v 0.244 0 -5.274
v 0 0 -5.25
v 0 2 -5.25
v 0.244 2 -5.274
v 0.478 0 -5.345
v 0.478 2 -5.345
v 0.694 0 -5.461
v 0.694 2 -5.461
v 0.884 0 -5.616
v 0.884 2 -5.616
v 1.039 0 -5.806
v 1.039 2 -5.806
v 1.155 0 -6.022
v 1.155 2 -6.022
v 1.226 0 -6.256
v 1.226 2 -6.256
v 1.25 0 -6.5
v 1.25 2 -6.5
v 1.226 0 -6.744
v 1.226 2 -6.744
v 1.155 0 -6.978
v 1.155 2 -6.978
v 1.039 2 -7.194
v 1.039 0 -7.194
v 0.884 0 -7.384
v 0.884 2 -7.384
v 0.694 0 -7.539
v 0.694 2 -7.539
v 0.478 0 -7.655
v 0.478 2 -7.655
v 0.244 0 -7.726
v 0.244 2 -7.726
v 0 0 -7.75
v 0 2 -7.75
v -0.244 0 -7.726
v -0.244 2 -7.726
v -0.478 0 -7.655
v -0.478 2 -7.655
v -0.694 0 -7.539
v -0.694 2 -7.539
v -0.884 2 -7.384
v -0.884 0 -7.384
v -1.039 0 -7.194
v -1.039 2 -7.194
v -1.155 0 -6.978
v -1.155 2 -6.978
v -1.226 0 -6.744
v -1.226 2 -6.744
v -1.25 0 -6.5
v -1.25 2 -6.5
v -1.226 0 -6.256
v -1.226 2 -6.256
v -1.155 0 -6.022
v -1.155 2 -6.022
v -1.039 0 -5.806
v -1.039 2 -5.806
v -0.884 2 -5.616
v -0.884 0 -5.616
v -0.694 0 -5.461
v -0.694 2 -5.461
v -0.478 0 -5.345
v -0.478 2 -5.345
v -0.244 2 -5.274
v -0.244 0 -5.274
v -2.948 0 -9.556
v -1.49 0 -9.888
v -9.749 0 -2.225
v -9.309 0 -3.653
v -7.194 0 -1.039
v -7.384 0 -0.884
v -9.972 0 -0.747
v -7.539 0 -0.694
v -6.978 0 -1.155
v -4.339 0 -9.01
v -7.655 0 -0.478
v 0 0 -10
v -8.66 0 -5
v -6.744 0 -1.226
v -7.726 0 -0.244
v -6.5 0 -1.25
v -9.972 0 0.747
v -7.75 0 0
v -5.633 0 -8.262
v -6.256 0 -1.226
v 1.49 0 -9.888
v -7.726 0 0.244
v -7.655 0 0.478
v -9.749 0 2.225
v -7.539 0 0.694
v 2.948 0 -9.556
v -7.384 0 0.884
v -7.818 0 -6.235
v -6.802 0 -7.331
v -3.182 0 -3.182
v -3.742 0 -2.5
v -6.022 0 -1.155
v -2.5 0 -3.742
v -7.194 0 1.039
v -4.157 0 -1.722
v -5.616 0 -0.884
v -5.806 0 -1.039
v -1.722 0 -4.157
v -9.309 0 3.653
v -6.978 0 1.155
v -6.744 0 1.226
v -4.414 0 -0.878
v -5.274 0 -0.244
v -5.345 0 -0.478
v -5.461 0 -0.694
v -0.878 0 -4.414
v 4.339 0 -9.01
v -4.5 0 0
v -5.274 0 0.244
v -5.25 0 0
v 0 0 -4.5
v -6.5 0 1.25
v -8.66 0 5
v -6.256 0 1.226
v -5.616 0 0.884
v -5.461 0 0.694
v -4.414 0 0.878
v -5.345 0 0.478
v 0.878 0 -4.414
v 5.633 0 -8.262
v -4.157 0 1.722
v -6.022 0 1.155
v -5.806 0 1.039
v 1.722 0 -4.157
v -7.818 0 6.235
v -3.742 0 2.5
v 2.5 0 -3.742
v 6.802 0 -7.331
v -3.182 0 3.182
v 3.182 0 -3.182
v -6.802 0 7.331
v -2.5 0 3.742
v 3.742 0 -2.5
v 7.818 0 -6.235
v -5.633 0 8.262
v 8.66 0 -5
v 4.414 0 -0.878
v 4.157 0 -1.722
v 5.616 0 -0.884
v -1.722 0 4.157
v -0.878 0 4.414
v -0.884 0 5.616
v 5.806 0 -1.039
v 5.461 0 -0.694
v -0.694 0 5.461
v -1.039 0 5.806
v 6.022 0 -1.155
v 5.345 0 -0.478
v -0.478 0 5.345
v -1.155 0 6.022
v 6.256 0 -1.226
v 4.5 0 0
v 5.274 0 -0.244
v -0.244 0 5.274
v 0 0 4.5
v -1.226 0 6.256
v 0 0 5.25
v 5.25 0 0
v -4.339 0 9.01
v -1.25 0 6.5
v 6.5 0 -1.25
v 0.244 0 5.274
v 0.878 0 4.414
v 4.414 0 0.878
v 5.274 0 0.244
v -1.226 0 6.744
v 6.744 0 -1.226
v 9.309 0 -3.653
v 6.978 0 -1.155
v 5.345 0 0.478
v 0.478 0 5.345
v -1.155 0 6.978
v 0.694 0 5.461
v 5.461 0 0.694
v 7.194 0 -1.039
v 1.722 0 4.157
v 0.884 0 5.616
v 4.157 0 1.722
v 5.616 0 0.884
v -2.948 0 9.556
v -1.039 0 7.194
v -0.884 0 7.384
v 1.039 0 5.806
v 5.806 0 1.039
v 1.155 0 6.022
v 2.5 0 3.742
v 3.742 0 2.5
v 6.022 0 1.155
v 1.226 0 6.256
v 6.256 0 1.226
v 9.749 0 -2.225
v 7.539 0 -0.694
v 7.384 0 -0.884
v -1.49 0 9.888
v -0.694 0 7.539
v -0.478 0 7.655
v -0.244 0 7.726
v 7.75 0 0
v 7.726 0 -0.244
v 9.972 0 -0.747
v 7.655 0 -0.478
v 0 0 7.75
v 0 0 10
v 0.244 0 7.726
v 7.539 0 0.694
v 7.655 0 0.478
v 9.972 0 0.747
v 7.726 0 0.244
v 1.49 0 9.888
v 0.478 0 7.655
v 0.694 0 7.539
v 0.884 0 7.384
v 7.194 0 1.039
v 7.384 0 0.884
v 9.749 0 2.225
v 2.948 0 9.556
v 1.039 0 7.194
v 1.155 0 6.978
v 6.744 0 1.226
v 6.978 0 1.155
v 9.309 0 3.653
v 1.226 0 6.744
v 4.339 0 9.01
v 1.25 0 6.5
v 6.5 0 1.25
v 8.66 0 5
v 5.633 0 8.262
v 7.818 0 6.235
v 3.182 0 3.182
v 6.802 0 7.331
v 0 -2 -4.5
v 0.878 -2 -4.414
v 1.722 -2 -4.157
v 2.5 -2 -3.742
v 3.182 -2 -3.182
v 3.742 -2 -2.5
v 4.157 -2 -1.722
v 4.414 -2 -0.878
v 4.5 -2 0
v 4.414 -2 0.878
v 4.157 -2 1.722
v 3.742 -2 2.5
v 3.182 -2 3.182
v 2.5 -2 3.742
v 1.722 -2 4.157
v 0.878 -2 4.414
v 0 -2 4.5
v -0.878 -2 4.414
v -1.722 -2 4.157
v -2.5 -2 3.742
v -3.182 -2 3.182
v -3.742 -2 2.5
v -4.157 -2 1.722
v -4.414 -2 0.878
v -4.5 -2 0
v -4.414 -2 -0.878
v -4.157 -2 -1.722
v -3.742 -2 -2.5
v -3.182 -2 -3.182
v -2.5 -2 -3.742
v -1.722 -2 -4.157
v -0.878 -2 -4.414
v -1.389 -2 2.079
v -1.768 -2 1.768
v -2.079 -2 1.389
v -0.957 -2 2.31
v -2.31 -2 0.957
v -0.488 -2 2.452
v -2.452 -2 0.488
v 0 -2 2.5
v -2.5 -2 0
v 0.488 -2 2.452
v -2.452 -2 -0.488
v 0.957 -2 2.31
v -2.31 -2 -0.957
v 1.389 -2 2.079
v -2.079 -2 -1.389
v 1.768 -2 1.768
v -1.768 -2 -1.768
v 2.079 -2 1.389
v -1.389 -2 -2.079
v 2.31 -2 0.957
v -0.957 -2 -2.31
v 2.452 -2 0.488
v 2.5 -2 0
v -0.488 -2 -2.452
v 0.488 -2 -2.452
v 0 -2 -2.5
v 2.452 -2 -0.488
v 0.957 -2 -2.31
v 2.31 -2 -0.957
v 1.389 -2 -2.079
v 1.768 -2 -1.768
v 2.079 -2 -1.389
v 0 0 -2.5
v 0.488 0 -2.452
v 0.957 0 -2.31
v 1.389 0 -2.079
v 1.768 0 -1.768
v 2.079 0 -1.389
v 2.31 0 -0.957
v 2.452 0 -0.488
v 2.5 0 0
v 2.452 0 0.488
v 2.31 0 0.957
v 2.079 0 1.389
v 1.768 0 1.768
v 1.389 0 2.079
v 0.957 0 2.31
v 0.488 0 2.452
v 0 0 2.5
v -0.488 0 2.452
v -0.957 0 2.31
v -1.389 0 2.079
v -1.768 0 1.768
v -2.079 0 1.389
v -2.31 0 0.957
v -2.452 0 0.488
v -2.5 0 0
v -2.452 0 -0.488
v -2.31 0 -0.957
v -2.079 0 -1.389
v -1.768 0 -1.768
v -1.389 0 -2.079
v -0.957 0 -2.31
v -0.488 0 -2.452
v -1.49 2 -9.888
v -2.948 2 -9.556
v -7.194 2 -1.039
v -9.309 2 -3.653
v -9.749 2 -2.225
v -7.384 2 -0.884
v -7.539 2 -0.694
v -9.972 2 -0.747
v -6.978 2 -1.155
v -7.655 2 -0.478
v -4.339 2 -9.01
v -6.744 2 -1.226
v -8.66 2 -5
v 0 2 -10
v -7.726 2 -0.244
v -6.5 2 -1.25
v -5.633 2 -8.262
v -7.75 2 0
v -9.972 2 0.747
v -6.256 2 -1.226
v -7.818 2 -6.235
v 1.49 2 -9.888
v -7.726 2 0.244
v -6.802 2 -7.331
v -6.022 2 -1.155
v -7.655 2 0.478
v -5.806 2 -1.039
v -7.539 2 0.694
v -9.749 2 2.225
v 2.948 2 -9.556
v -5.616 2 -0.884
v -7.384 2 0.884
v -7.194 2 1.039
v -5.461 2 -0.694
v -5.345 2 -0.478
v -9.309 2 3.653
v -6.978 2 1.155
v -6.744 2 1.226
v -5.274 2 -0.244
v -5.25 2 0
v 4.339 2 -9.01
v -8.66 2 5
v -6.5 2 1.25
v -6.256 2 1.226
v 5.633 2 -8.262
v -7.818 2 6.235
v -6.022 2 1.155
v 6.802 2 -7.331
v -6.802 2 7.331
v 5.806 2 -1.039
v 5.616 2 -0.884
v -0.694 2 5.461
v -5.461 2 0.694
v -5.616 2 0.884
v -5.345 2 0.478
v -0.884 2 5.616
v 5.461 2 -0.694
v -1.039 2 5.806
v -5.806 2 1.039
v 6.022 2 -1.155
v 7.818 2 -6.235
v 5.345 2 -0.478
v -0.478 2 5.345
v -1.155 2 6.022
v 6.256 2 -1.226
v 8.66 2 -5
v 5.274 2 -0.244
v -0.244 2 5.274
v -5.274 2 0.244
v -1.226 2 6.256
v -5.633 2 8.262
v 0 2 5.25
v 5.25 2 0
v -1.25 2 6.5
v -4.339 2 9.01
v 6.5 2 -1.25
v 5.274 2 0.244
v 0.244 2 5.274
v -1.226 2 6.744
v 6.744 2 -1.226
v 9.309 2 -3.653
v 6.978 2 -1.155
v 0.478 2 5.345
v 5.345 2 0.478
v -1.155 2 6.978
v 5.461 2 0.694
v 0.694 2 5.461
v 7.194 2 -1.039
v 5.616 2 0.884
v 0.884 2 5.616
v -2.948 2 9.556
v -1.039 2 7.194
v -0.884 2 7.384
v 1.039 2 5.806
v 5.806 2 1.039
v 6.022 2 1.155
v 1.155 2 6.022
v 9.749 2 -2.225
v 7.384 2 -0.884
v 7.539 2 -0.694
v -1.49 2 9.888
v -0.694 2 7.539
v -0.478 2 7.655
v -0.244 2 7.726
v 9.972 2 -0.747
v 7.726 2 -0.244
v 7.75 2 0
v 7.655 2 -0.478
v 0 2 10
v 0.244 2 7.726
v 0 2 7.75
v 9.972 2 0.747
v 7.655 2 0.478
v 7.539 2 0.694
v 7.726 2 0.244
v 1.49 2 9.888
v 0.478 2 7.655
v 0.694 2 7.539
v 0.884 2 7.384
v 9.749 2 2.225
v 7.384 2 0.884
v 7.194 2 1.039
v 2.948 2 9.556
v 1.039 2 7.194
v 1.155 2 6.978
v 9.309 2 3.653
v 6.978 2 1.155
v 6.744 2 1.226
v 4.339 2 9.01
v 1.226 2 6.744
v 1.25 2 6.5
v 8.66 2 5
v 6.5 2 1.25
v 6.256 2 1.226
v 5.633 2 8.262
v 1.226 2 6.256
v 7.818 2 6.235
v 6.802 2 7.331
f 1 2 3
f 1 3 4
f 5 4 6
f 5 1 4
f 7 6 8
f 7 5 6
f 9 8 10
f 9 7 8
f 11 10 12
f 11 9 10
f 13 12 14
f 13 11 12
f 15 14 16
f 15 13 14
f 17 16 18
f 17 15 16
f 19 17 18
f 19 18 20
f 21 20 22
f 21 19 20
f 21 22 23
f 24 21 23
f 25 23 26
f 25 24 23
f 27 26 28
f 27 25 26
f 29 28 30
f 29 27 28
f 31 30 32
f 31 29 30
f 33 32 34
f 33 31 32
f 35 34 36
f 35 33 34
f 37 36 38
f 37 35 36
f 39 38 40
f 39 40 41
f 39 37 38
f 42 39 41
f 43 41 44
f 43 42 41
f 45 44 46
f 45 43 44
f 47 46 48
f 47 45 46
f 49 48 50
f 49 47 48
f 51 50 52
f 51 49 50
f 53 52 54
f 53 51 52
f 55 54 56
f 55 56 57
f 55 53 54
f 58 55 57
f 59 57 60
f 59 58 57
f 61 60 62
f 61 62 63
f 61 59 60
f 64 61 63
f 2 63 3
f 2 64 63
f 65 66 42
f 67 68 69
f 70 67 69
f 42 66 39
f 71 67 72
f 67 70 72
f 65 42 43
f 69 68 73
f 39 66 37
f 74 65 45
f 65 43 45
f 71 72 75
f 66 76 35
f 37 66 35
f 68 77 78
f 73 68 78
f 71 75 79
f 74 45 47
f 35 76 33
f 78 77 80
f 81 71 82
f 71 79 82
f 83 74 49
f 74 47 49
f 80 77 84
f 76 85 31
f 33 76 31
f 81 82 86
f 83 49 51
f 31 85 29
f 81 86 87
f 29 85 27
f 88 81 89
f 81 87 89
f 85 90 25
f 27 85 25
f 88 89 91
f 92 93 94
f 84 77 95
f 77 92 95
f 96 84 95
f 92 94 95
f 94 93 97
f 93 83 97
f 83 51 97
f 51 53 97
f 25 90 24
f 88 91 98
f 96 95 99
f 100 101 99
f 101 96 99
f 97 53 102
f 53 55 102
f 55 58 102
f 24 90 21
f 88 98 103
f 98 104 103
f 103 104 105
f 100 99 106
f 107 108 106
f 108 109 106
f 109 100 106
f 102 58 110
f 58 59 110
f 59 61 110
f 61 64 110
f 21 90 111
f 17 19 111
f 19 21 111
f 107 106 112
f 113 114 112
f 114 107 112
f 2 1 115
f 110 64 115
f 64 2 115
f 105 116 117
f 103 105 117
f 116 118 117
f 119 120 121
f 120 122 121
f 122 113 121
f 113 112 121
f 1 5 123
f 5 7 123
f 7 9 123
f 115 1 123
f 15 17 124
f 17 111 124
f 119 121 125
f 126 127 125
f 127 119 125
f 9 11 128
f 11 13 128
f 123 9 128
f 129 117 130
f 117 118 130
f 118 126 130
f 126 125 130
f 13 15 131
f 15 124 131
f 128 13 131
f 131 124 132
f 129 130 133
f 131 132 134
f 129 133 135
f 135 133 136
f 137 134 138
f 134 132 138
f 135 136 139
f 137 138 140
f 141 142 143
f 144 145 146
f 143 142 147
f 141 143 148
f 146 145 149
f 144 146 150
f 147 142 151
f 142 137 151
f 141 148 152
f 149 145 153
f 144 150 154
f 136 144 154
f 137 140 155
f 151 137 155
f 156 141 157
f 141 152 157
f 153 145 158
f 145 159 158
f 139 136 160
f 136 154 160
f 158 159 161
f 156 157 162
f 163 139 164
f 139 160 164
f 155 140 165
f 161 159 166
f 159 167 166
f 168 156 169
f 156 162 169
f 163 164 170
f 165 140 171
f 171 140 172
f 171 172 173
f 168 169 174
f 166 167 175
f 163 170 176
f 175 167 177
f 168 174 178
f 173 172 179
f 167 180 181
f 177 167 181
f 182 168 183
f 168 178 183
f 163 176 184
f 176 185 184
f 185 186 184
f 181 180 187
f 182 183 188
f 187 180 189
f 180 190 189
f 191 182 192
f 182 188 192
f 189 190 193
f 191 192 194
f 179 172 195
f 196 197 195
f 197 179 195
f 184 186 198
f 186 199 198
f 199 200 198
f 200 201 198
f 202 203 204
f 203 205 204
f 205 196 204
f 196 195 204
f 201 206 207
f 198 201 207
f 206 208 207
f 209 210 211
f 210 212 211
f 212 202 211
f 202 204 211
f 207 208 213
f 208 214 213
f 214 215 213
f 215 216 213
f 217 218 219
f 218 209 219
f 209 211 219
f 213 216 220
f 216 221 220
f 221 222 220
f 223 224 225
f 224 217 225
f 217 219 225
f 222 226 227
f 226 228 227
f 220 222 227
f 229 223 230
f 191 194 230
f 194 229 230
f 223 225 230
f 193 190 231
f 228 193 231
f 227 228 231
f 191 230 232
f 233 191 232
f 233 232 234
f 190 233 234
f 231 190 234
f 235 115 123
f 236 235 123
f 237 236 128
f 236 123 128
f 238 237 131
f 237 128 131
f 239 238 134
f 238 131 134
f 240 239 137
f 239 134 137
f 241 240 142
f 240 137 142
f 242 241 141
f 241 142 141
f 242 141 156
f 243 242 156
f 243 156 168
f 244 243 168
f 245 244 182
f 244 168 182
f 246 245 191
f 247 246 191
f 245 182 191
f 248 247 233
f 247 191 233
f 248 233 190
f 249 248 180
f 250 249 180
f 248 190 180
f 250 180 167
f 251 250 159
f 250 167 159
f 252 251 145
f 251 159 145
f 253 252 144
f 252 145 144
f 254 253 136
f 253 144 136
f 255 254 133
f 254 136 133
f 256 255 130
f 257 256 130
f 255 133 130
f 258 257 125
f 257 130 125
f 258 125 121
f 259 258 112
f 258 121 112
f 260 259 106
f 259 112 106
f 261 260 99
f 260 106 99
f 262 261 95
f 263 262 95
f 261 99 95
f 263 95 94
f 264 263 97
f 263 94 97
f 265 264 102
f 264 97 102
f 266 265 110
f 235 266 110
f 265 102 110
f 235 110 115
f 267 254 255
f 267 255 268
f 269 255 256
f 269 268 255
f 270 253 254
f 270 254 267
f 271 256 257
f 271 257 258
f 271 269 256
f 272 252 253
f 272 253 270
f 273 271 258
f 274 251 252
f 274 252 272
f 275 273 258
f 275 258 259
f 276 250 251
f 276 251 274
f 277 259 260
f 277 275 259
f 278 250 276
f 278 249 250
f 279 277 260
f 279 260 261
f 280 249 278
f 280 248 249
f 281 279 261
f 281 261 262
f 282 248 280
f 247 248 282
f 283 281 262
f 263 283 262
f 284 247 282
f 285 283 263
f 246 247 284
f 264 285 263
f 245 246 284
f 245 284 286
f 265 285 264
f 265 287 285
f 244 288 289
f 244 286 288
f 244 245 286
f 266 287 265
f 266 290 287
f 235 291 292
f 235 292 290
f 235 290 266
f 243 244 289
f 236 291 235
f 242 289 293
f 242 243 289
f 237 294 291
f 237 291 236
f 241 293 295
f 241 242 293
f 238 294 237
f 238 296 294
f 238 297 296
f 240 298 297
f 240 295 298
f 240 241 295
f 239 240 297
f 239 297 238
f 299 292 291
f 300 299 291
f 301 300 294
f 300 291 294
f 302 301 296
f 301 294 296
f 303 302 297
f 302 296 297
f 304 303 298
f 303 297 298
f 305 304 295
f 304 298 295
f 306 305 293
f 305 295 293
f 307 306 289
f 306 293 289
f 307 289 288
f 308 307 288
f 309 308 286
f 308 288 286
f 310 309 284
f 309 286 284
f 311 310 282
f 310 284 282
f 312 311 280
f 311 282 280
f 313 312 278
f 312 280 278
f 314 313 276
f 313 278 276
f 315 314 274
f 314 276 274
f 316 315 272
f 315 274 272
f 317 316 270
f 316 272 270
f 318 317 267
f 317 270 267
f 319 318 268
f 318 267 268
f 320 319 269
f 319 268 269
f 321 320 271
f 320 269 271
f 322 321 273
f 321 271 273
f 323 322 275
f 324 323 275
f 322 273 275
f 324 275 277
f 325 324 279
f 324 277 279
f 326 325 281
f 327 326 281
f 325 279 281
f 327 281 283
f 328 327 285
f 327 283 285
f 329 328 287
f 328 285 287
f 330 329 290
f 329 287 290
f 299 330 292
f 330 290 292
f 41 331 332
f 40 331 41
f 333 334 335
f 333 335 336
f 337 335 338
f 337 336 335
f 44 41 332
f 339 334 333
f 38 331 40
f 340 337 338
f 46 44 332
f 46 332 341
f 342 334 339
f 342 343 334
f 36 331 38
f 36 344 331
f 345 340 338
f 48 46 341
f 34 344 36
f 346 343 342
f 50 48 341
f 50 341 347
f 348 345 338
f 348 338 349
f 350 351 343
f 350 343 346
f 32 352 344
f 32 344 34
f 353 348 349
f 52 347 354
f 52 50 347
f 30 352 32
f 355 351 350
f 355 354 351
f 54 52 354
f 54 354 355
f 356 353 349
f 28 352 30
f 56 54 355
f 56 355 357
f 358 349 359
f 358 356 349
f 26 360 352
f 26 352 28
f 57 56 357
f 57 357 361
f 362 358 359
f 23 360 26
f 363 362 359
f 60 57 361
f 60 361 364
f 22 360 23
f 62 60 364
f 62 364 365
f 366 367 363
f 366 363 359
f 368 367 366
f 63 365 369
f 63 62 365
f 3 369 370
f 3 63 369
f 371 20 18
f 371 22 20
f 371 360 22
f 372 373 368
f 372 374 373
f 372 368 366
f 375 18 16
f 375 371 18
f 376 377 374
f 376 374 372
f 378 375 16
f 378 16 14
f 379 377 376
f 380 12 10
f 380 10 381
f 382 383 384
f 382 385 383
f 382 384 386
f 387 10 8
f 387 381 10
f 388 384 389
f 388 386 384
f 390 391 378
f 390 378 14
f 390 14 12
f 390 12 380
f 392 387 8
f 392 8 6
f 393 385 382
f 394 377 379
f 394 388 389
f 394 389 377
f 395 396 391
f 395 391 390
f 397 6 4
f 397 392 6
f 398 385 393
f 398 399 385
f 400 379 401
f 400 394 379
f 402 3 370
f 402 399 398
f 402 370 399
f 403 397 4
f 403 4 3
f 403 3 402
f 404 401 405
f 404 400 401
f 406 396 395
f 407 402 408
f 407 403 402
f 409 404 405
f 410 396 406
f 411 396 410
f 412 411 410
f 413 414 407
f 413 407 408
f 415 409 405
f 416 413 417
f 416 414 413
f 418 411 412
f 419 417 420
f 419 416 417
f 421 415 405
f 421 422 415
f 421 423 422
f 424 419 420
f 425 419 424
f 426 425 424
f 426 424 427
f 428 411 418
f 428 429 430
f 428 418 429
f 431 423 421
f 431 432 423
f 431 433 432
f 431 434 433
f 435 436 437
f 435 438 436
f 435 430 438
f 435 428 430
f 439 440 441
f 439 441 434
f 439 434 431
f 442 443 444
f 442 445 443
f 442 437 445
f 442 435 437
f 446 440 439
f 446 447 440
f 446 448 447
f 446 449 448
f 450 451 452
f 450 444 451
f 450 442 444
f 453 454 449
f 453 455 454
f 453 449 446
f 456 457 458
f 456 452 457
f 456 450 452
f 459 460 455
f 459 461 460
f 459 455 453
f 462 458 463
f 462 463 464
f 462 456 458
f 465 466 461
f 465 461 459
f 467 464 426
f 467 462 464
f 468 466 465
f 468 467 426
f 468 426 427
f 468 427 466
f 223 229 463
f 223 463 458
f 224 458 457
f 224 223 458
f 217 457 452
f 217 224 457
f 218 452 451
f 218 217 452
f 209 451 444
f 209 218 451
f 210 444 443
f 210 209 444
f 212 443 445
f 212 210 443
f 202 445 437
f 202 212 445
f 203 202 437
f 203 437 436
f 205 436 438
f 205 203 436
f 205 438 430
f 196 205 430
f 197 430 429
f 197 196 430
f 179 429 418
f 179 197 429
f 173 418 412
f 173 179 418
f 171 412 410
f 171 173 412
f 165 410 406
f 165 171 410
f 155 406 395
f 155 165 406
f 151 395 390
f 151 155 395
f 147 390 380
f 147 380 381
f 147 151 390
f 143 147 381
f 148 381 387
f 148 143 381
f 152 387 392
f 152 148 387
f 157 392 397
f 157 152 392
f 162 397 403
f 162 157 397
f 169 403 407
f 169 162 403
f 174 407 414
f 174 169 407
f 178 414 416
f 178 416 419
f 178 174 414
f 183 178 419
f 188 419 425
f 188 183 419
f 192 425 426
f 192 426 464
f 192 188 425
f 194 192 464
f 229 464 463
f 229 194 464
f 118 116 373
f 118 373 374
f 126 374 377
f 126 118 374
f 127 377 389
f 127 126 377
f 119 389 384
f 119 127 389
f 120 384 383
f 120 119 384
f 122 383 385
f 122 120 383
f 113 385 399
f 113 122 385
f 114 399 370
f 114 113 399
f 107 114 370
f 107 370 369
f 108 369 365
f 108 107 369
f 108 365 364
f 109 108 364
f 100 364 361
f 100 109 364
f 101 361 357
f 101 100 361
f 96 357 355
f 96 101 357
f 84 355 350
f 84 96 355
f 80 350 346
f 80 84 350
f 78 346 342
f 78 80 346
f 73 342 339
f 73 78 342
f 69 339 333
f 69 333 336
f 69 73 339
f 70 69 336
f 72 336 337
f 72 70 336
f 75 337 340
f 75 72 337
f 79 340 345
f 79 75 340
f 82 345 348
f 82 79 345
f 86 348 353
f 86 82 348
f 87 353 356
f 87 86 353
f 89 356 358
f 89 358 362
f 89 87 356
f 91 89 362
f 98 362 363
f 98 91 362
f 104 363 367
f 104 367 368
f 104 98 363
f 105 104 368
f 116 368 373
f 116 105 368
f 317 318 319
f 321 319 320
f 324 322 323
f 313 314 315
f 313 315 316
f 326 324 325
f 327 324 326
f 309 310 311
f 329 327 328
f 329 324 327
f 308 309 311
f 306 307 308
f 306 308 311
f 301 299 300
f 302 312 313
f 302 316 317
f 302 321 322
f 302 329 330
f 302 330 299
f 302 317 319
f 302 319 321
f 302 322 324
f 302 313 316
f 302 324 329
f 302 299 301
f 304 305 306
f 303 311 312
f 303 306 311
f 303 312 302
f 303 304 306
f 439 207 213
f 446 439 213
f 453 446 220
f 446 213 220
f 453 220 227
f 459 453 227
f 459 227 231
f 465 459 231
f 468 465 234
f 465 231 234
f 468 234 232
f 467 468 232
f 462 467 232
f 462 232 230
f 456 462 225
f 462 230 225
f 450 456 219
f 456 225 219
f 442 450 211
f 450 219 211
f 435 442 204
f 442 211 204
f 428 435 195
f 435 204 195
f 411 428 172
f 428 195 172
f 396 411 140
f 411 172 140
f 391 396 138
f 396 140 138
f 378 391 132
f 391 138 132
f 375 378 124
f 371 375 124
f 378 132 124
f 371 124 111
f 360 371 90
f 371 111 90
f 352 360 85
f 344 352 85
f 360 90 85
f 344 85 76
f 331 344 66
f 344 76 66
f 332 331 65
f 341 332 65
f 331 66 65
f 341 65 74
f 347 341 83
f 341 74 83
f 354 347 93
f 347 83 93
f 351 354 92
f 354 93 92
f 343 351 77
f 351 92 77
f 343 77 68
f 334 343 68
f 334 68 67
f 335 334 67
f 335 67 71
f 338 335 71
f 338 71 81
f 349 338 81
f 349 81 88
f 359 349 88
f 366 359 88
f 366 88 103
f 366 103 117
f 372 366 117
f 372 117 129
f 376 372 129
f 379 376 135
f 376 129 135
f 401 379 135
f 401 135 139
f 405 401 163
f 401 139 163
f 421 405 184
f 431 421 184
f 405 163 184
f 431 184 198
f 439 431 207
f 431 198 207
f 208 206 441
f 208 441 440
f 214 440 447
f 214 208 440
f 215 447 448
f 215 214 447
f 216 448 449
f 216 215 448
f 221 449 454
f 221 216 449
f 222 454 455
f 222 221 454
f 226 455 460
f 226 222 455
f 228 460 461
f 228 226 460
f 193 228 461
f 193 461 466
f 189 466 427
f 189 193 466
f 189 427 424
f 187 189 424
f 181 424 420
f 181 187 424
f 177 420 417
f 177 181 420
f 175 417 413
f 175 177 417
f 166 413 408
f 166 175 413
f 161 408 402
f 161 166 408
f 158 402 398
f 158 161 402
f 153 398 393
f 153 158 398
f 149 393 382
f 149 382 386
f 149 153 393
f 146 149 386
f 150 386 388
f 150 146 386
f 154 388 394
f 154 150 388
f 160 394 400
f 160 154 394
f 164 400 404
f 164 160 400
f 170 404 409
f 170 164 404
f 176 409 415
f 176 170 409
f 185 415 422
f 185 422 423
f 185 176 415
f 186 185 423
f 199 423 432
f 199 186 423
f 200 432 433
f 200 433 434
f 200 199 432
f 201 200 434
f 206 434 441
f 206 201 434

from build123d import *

# Parameters (mm, degrees)
SKETCH_1_R          = 10
SKETCH_1_R_2        = 1.25
EXTRUDE_1_DEPTH     = 2
SKETCH_2_R          = 4.5
EXTRUDE_2_DEPTH     = 2
SKETCH_3_R          = 2.5
CUT_EXTRUDE_1_DEPTH = 2


with BuildPart() as part:
    # 草图1 → 凸台-拉伸1 (new body)
    with BuildSketch(Plane(origin=(0, 0, 0), x_dir=(1, 0, 0), z_dir=(0, 1, 0))):
        with Locations(Location((0, 0, 0), (0, 0, 270))):
            Circle(SKETCH_1_R)
        with Locations(Location((0, 6.5, 0), (0, 0, 270))):
            Circle(SKETCH_1_R_2, mode=Mode.SUBTRACT)
        with Locations(Location((6.5, 0, 0), (0, 0, 270))):
            Circle(SKETCH_1_R_2, mode=Mode.SUBTRACT)
        with Locations(Location((0, -6.5, 0), (0, 0, 270))):
            Circle(SKETCH_1_R_2, mode=Mode.SUBTRACT)
        with Locations(Location((-6.5, 0, 0), (0, 0, 270))):
            Circle(SKETCH_1_R_2, mode=Mode.SUBTRACT)
    extrude(amount=EXTRUDE_1_DEPTH)

    # 草图2 → 凸台-拉伸2 (add)
    with BuildSketch(Plane.XZ):
        with Locations(Location((0, 0, 0), (0, 0, 270))):
            Circle(SKETCH_2_R)
    extrude(amount=EXTRUDE_2_DEPTH)

    # 草图3 → 切除-拉伸1 (cut)
    with BuildSketch(Plane.XZ.offset(2)):
        with Locations(Location((0, 0, 0), (0, 0, 270))):
            Circle(SKETCH_3_R)
    extrude(amount=-CUT_EXTRUDE_1_DEPTH, mode=Mode.SUBTRACT)


solid = part.part
